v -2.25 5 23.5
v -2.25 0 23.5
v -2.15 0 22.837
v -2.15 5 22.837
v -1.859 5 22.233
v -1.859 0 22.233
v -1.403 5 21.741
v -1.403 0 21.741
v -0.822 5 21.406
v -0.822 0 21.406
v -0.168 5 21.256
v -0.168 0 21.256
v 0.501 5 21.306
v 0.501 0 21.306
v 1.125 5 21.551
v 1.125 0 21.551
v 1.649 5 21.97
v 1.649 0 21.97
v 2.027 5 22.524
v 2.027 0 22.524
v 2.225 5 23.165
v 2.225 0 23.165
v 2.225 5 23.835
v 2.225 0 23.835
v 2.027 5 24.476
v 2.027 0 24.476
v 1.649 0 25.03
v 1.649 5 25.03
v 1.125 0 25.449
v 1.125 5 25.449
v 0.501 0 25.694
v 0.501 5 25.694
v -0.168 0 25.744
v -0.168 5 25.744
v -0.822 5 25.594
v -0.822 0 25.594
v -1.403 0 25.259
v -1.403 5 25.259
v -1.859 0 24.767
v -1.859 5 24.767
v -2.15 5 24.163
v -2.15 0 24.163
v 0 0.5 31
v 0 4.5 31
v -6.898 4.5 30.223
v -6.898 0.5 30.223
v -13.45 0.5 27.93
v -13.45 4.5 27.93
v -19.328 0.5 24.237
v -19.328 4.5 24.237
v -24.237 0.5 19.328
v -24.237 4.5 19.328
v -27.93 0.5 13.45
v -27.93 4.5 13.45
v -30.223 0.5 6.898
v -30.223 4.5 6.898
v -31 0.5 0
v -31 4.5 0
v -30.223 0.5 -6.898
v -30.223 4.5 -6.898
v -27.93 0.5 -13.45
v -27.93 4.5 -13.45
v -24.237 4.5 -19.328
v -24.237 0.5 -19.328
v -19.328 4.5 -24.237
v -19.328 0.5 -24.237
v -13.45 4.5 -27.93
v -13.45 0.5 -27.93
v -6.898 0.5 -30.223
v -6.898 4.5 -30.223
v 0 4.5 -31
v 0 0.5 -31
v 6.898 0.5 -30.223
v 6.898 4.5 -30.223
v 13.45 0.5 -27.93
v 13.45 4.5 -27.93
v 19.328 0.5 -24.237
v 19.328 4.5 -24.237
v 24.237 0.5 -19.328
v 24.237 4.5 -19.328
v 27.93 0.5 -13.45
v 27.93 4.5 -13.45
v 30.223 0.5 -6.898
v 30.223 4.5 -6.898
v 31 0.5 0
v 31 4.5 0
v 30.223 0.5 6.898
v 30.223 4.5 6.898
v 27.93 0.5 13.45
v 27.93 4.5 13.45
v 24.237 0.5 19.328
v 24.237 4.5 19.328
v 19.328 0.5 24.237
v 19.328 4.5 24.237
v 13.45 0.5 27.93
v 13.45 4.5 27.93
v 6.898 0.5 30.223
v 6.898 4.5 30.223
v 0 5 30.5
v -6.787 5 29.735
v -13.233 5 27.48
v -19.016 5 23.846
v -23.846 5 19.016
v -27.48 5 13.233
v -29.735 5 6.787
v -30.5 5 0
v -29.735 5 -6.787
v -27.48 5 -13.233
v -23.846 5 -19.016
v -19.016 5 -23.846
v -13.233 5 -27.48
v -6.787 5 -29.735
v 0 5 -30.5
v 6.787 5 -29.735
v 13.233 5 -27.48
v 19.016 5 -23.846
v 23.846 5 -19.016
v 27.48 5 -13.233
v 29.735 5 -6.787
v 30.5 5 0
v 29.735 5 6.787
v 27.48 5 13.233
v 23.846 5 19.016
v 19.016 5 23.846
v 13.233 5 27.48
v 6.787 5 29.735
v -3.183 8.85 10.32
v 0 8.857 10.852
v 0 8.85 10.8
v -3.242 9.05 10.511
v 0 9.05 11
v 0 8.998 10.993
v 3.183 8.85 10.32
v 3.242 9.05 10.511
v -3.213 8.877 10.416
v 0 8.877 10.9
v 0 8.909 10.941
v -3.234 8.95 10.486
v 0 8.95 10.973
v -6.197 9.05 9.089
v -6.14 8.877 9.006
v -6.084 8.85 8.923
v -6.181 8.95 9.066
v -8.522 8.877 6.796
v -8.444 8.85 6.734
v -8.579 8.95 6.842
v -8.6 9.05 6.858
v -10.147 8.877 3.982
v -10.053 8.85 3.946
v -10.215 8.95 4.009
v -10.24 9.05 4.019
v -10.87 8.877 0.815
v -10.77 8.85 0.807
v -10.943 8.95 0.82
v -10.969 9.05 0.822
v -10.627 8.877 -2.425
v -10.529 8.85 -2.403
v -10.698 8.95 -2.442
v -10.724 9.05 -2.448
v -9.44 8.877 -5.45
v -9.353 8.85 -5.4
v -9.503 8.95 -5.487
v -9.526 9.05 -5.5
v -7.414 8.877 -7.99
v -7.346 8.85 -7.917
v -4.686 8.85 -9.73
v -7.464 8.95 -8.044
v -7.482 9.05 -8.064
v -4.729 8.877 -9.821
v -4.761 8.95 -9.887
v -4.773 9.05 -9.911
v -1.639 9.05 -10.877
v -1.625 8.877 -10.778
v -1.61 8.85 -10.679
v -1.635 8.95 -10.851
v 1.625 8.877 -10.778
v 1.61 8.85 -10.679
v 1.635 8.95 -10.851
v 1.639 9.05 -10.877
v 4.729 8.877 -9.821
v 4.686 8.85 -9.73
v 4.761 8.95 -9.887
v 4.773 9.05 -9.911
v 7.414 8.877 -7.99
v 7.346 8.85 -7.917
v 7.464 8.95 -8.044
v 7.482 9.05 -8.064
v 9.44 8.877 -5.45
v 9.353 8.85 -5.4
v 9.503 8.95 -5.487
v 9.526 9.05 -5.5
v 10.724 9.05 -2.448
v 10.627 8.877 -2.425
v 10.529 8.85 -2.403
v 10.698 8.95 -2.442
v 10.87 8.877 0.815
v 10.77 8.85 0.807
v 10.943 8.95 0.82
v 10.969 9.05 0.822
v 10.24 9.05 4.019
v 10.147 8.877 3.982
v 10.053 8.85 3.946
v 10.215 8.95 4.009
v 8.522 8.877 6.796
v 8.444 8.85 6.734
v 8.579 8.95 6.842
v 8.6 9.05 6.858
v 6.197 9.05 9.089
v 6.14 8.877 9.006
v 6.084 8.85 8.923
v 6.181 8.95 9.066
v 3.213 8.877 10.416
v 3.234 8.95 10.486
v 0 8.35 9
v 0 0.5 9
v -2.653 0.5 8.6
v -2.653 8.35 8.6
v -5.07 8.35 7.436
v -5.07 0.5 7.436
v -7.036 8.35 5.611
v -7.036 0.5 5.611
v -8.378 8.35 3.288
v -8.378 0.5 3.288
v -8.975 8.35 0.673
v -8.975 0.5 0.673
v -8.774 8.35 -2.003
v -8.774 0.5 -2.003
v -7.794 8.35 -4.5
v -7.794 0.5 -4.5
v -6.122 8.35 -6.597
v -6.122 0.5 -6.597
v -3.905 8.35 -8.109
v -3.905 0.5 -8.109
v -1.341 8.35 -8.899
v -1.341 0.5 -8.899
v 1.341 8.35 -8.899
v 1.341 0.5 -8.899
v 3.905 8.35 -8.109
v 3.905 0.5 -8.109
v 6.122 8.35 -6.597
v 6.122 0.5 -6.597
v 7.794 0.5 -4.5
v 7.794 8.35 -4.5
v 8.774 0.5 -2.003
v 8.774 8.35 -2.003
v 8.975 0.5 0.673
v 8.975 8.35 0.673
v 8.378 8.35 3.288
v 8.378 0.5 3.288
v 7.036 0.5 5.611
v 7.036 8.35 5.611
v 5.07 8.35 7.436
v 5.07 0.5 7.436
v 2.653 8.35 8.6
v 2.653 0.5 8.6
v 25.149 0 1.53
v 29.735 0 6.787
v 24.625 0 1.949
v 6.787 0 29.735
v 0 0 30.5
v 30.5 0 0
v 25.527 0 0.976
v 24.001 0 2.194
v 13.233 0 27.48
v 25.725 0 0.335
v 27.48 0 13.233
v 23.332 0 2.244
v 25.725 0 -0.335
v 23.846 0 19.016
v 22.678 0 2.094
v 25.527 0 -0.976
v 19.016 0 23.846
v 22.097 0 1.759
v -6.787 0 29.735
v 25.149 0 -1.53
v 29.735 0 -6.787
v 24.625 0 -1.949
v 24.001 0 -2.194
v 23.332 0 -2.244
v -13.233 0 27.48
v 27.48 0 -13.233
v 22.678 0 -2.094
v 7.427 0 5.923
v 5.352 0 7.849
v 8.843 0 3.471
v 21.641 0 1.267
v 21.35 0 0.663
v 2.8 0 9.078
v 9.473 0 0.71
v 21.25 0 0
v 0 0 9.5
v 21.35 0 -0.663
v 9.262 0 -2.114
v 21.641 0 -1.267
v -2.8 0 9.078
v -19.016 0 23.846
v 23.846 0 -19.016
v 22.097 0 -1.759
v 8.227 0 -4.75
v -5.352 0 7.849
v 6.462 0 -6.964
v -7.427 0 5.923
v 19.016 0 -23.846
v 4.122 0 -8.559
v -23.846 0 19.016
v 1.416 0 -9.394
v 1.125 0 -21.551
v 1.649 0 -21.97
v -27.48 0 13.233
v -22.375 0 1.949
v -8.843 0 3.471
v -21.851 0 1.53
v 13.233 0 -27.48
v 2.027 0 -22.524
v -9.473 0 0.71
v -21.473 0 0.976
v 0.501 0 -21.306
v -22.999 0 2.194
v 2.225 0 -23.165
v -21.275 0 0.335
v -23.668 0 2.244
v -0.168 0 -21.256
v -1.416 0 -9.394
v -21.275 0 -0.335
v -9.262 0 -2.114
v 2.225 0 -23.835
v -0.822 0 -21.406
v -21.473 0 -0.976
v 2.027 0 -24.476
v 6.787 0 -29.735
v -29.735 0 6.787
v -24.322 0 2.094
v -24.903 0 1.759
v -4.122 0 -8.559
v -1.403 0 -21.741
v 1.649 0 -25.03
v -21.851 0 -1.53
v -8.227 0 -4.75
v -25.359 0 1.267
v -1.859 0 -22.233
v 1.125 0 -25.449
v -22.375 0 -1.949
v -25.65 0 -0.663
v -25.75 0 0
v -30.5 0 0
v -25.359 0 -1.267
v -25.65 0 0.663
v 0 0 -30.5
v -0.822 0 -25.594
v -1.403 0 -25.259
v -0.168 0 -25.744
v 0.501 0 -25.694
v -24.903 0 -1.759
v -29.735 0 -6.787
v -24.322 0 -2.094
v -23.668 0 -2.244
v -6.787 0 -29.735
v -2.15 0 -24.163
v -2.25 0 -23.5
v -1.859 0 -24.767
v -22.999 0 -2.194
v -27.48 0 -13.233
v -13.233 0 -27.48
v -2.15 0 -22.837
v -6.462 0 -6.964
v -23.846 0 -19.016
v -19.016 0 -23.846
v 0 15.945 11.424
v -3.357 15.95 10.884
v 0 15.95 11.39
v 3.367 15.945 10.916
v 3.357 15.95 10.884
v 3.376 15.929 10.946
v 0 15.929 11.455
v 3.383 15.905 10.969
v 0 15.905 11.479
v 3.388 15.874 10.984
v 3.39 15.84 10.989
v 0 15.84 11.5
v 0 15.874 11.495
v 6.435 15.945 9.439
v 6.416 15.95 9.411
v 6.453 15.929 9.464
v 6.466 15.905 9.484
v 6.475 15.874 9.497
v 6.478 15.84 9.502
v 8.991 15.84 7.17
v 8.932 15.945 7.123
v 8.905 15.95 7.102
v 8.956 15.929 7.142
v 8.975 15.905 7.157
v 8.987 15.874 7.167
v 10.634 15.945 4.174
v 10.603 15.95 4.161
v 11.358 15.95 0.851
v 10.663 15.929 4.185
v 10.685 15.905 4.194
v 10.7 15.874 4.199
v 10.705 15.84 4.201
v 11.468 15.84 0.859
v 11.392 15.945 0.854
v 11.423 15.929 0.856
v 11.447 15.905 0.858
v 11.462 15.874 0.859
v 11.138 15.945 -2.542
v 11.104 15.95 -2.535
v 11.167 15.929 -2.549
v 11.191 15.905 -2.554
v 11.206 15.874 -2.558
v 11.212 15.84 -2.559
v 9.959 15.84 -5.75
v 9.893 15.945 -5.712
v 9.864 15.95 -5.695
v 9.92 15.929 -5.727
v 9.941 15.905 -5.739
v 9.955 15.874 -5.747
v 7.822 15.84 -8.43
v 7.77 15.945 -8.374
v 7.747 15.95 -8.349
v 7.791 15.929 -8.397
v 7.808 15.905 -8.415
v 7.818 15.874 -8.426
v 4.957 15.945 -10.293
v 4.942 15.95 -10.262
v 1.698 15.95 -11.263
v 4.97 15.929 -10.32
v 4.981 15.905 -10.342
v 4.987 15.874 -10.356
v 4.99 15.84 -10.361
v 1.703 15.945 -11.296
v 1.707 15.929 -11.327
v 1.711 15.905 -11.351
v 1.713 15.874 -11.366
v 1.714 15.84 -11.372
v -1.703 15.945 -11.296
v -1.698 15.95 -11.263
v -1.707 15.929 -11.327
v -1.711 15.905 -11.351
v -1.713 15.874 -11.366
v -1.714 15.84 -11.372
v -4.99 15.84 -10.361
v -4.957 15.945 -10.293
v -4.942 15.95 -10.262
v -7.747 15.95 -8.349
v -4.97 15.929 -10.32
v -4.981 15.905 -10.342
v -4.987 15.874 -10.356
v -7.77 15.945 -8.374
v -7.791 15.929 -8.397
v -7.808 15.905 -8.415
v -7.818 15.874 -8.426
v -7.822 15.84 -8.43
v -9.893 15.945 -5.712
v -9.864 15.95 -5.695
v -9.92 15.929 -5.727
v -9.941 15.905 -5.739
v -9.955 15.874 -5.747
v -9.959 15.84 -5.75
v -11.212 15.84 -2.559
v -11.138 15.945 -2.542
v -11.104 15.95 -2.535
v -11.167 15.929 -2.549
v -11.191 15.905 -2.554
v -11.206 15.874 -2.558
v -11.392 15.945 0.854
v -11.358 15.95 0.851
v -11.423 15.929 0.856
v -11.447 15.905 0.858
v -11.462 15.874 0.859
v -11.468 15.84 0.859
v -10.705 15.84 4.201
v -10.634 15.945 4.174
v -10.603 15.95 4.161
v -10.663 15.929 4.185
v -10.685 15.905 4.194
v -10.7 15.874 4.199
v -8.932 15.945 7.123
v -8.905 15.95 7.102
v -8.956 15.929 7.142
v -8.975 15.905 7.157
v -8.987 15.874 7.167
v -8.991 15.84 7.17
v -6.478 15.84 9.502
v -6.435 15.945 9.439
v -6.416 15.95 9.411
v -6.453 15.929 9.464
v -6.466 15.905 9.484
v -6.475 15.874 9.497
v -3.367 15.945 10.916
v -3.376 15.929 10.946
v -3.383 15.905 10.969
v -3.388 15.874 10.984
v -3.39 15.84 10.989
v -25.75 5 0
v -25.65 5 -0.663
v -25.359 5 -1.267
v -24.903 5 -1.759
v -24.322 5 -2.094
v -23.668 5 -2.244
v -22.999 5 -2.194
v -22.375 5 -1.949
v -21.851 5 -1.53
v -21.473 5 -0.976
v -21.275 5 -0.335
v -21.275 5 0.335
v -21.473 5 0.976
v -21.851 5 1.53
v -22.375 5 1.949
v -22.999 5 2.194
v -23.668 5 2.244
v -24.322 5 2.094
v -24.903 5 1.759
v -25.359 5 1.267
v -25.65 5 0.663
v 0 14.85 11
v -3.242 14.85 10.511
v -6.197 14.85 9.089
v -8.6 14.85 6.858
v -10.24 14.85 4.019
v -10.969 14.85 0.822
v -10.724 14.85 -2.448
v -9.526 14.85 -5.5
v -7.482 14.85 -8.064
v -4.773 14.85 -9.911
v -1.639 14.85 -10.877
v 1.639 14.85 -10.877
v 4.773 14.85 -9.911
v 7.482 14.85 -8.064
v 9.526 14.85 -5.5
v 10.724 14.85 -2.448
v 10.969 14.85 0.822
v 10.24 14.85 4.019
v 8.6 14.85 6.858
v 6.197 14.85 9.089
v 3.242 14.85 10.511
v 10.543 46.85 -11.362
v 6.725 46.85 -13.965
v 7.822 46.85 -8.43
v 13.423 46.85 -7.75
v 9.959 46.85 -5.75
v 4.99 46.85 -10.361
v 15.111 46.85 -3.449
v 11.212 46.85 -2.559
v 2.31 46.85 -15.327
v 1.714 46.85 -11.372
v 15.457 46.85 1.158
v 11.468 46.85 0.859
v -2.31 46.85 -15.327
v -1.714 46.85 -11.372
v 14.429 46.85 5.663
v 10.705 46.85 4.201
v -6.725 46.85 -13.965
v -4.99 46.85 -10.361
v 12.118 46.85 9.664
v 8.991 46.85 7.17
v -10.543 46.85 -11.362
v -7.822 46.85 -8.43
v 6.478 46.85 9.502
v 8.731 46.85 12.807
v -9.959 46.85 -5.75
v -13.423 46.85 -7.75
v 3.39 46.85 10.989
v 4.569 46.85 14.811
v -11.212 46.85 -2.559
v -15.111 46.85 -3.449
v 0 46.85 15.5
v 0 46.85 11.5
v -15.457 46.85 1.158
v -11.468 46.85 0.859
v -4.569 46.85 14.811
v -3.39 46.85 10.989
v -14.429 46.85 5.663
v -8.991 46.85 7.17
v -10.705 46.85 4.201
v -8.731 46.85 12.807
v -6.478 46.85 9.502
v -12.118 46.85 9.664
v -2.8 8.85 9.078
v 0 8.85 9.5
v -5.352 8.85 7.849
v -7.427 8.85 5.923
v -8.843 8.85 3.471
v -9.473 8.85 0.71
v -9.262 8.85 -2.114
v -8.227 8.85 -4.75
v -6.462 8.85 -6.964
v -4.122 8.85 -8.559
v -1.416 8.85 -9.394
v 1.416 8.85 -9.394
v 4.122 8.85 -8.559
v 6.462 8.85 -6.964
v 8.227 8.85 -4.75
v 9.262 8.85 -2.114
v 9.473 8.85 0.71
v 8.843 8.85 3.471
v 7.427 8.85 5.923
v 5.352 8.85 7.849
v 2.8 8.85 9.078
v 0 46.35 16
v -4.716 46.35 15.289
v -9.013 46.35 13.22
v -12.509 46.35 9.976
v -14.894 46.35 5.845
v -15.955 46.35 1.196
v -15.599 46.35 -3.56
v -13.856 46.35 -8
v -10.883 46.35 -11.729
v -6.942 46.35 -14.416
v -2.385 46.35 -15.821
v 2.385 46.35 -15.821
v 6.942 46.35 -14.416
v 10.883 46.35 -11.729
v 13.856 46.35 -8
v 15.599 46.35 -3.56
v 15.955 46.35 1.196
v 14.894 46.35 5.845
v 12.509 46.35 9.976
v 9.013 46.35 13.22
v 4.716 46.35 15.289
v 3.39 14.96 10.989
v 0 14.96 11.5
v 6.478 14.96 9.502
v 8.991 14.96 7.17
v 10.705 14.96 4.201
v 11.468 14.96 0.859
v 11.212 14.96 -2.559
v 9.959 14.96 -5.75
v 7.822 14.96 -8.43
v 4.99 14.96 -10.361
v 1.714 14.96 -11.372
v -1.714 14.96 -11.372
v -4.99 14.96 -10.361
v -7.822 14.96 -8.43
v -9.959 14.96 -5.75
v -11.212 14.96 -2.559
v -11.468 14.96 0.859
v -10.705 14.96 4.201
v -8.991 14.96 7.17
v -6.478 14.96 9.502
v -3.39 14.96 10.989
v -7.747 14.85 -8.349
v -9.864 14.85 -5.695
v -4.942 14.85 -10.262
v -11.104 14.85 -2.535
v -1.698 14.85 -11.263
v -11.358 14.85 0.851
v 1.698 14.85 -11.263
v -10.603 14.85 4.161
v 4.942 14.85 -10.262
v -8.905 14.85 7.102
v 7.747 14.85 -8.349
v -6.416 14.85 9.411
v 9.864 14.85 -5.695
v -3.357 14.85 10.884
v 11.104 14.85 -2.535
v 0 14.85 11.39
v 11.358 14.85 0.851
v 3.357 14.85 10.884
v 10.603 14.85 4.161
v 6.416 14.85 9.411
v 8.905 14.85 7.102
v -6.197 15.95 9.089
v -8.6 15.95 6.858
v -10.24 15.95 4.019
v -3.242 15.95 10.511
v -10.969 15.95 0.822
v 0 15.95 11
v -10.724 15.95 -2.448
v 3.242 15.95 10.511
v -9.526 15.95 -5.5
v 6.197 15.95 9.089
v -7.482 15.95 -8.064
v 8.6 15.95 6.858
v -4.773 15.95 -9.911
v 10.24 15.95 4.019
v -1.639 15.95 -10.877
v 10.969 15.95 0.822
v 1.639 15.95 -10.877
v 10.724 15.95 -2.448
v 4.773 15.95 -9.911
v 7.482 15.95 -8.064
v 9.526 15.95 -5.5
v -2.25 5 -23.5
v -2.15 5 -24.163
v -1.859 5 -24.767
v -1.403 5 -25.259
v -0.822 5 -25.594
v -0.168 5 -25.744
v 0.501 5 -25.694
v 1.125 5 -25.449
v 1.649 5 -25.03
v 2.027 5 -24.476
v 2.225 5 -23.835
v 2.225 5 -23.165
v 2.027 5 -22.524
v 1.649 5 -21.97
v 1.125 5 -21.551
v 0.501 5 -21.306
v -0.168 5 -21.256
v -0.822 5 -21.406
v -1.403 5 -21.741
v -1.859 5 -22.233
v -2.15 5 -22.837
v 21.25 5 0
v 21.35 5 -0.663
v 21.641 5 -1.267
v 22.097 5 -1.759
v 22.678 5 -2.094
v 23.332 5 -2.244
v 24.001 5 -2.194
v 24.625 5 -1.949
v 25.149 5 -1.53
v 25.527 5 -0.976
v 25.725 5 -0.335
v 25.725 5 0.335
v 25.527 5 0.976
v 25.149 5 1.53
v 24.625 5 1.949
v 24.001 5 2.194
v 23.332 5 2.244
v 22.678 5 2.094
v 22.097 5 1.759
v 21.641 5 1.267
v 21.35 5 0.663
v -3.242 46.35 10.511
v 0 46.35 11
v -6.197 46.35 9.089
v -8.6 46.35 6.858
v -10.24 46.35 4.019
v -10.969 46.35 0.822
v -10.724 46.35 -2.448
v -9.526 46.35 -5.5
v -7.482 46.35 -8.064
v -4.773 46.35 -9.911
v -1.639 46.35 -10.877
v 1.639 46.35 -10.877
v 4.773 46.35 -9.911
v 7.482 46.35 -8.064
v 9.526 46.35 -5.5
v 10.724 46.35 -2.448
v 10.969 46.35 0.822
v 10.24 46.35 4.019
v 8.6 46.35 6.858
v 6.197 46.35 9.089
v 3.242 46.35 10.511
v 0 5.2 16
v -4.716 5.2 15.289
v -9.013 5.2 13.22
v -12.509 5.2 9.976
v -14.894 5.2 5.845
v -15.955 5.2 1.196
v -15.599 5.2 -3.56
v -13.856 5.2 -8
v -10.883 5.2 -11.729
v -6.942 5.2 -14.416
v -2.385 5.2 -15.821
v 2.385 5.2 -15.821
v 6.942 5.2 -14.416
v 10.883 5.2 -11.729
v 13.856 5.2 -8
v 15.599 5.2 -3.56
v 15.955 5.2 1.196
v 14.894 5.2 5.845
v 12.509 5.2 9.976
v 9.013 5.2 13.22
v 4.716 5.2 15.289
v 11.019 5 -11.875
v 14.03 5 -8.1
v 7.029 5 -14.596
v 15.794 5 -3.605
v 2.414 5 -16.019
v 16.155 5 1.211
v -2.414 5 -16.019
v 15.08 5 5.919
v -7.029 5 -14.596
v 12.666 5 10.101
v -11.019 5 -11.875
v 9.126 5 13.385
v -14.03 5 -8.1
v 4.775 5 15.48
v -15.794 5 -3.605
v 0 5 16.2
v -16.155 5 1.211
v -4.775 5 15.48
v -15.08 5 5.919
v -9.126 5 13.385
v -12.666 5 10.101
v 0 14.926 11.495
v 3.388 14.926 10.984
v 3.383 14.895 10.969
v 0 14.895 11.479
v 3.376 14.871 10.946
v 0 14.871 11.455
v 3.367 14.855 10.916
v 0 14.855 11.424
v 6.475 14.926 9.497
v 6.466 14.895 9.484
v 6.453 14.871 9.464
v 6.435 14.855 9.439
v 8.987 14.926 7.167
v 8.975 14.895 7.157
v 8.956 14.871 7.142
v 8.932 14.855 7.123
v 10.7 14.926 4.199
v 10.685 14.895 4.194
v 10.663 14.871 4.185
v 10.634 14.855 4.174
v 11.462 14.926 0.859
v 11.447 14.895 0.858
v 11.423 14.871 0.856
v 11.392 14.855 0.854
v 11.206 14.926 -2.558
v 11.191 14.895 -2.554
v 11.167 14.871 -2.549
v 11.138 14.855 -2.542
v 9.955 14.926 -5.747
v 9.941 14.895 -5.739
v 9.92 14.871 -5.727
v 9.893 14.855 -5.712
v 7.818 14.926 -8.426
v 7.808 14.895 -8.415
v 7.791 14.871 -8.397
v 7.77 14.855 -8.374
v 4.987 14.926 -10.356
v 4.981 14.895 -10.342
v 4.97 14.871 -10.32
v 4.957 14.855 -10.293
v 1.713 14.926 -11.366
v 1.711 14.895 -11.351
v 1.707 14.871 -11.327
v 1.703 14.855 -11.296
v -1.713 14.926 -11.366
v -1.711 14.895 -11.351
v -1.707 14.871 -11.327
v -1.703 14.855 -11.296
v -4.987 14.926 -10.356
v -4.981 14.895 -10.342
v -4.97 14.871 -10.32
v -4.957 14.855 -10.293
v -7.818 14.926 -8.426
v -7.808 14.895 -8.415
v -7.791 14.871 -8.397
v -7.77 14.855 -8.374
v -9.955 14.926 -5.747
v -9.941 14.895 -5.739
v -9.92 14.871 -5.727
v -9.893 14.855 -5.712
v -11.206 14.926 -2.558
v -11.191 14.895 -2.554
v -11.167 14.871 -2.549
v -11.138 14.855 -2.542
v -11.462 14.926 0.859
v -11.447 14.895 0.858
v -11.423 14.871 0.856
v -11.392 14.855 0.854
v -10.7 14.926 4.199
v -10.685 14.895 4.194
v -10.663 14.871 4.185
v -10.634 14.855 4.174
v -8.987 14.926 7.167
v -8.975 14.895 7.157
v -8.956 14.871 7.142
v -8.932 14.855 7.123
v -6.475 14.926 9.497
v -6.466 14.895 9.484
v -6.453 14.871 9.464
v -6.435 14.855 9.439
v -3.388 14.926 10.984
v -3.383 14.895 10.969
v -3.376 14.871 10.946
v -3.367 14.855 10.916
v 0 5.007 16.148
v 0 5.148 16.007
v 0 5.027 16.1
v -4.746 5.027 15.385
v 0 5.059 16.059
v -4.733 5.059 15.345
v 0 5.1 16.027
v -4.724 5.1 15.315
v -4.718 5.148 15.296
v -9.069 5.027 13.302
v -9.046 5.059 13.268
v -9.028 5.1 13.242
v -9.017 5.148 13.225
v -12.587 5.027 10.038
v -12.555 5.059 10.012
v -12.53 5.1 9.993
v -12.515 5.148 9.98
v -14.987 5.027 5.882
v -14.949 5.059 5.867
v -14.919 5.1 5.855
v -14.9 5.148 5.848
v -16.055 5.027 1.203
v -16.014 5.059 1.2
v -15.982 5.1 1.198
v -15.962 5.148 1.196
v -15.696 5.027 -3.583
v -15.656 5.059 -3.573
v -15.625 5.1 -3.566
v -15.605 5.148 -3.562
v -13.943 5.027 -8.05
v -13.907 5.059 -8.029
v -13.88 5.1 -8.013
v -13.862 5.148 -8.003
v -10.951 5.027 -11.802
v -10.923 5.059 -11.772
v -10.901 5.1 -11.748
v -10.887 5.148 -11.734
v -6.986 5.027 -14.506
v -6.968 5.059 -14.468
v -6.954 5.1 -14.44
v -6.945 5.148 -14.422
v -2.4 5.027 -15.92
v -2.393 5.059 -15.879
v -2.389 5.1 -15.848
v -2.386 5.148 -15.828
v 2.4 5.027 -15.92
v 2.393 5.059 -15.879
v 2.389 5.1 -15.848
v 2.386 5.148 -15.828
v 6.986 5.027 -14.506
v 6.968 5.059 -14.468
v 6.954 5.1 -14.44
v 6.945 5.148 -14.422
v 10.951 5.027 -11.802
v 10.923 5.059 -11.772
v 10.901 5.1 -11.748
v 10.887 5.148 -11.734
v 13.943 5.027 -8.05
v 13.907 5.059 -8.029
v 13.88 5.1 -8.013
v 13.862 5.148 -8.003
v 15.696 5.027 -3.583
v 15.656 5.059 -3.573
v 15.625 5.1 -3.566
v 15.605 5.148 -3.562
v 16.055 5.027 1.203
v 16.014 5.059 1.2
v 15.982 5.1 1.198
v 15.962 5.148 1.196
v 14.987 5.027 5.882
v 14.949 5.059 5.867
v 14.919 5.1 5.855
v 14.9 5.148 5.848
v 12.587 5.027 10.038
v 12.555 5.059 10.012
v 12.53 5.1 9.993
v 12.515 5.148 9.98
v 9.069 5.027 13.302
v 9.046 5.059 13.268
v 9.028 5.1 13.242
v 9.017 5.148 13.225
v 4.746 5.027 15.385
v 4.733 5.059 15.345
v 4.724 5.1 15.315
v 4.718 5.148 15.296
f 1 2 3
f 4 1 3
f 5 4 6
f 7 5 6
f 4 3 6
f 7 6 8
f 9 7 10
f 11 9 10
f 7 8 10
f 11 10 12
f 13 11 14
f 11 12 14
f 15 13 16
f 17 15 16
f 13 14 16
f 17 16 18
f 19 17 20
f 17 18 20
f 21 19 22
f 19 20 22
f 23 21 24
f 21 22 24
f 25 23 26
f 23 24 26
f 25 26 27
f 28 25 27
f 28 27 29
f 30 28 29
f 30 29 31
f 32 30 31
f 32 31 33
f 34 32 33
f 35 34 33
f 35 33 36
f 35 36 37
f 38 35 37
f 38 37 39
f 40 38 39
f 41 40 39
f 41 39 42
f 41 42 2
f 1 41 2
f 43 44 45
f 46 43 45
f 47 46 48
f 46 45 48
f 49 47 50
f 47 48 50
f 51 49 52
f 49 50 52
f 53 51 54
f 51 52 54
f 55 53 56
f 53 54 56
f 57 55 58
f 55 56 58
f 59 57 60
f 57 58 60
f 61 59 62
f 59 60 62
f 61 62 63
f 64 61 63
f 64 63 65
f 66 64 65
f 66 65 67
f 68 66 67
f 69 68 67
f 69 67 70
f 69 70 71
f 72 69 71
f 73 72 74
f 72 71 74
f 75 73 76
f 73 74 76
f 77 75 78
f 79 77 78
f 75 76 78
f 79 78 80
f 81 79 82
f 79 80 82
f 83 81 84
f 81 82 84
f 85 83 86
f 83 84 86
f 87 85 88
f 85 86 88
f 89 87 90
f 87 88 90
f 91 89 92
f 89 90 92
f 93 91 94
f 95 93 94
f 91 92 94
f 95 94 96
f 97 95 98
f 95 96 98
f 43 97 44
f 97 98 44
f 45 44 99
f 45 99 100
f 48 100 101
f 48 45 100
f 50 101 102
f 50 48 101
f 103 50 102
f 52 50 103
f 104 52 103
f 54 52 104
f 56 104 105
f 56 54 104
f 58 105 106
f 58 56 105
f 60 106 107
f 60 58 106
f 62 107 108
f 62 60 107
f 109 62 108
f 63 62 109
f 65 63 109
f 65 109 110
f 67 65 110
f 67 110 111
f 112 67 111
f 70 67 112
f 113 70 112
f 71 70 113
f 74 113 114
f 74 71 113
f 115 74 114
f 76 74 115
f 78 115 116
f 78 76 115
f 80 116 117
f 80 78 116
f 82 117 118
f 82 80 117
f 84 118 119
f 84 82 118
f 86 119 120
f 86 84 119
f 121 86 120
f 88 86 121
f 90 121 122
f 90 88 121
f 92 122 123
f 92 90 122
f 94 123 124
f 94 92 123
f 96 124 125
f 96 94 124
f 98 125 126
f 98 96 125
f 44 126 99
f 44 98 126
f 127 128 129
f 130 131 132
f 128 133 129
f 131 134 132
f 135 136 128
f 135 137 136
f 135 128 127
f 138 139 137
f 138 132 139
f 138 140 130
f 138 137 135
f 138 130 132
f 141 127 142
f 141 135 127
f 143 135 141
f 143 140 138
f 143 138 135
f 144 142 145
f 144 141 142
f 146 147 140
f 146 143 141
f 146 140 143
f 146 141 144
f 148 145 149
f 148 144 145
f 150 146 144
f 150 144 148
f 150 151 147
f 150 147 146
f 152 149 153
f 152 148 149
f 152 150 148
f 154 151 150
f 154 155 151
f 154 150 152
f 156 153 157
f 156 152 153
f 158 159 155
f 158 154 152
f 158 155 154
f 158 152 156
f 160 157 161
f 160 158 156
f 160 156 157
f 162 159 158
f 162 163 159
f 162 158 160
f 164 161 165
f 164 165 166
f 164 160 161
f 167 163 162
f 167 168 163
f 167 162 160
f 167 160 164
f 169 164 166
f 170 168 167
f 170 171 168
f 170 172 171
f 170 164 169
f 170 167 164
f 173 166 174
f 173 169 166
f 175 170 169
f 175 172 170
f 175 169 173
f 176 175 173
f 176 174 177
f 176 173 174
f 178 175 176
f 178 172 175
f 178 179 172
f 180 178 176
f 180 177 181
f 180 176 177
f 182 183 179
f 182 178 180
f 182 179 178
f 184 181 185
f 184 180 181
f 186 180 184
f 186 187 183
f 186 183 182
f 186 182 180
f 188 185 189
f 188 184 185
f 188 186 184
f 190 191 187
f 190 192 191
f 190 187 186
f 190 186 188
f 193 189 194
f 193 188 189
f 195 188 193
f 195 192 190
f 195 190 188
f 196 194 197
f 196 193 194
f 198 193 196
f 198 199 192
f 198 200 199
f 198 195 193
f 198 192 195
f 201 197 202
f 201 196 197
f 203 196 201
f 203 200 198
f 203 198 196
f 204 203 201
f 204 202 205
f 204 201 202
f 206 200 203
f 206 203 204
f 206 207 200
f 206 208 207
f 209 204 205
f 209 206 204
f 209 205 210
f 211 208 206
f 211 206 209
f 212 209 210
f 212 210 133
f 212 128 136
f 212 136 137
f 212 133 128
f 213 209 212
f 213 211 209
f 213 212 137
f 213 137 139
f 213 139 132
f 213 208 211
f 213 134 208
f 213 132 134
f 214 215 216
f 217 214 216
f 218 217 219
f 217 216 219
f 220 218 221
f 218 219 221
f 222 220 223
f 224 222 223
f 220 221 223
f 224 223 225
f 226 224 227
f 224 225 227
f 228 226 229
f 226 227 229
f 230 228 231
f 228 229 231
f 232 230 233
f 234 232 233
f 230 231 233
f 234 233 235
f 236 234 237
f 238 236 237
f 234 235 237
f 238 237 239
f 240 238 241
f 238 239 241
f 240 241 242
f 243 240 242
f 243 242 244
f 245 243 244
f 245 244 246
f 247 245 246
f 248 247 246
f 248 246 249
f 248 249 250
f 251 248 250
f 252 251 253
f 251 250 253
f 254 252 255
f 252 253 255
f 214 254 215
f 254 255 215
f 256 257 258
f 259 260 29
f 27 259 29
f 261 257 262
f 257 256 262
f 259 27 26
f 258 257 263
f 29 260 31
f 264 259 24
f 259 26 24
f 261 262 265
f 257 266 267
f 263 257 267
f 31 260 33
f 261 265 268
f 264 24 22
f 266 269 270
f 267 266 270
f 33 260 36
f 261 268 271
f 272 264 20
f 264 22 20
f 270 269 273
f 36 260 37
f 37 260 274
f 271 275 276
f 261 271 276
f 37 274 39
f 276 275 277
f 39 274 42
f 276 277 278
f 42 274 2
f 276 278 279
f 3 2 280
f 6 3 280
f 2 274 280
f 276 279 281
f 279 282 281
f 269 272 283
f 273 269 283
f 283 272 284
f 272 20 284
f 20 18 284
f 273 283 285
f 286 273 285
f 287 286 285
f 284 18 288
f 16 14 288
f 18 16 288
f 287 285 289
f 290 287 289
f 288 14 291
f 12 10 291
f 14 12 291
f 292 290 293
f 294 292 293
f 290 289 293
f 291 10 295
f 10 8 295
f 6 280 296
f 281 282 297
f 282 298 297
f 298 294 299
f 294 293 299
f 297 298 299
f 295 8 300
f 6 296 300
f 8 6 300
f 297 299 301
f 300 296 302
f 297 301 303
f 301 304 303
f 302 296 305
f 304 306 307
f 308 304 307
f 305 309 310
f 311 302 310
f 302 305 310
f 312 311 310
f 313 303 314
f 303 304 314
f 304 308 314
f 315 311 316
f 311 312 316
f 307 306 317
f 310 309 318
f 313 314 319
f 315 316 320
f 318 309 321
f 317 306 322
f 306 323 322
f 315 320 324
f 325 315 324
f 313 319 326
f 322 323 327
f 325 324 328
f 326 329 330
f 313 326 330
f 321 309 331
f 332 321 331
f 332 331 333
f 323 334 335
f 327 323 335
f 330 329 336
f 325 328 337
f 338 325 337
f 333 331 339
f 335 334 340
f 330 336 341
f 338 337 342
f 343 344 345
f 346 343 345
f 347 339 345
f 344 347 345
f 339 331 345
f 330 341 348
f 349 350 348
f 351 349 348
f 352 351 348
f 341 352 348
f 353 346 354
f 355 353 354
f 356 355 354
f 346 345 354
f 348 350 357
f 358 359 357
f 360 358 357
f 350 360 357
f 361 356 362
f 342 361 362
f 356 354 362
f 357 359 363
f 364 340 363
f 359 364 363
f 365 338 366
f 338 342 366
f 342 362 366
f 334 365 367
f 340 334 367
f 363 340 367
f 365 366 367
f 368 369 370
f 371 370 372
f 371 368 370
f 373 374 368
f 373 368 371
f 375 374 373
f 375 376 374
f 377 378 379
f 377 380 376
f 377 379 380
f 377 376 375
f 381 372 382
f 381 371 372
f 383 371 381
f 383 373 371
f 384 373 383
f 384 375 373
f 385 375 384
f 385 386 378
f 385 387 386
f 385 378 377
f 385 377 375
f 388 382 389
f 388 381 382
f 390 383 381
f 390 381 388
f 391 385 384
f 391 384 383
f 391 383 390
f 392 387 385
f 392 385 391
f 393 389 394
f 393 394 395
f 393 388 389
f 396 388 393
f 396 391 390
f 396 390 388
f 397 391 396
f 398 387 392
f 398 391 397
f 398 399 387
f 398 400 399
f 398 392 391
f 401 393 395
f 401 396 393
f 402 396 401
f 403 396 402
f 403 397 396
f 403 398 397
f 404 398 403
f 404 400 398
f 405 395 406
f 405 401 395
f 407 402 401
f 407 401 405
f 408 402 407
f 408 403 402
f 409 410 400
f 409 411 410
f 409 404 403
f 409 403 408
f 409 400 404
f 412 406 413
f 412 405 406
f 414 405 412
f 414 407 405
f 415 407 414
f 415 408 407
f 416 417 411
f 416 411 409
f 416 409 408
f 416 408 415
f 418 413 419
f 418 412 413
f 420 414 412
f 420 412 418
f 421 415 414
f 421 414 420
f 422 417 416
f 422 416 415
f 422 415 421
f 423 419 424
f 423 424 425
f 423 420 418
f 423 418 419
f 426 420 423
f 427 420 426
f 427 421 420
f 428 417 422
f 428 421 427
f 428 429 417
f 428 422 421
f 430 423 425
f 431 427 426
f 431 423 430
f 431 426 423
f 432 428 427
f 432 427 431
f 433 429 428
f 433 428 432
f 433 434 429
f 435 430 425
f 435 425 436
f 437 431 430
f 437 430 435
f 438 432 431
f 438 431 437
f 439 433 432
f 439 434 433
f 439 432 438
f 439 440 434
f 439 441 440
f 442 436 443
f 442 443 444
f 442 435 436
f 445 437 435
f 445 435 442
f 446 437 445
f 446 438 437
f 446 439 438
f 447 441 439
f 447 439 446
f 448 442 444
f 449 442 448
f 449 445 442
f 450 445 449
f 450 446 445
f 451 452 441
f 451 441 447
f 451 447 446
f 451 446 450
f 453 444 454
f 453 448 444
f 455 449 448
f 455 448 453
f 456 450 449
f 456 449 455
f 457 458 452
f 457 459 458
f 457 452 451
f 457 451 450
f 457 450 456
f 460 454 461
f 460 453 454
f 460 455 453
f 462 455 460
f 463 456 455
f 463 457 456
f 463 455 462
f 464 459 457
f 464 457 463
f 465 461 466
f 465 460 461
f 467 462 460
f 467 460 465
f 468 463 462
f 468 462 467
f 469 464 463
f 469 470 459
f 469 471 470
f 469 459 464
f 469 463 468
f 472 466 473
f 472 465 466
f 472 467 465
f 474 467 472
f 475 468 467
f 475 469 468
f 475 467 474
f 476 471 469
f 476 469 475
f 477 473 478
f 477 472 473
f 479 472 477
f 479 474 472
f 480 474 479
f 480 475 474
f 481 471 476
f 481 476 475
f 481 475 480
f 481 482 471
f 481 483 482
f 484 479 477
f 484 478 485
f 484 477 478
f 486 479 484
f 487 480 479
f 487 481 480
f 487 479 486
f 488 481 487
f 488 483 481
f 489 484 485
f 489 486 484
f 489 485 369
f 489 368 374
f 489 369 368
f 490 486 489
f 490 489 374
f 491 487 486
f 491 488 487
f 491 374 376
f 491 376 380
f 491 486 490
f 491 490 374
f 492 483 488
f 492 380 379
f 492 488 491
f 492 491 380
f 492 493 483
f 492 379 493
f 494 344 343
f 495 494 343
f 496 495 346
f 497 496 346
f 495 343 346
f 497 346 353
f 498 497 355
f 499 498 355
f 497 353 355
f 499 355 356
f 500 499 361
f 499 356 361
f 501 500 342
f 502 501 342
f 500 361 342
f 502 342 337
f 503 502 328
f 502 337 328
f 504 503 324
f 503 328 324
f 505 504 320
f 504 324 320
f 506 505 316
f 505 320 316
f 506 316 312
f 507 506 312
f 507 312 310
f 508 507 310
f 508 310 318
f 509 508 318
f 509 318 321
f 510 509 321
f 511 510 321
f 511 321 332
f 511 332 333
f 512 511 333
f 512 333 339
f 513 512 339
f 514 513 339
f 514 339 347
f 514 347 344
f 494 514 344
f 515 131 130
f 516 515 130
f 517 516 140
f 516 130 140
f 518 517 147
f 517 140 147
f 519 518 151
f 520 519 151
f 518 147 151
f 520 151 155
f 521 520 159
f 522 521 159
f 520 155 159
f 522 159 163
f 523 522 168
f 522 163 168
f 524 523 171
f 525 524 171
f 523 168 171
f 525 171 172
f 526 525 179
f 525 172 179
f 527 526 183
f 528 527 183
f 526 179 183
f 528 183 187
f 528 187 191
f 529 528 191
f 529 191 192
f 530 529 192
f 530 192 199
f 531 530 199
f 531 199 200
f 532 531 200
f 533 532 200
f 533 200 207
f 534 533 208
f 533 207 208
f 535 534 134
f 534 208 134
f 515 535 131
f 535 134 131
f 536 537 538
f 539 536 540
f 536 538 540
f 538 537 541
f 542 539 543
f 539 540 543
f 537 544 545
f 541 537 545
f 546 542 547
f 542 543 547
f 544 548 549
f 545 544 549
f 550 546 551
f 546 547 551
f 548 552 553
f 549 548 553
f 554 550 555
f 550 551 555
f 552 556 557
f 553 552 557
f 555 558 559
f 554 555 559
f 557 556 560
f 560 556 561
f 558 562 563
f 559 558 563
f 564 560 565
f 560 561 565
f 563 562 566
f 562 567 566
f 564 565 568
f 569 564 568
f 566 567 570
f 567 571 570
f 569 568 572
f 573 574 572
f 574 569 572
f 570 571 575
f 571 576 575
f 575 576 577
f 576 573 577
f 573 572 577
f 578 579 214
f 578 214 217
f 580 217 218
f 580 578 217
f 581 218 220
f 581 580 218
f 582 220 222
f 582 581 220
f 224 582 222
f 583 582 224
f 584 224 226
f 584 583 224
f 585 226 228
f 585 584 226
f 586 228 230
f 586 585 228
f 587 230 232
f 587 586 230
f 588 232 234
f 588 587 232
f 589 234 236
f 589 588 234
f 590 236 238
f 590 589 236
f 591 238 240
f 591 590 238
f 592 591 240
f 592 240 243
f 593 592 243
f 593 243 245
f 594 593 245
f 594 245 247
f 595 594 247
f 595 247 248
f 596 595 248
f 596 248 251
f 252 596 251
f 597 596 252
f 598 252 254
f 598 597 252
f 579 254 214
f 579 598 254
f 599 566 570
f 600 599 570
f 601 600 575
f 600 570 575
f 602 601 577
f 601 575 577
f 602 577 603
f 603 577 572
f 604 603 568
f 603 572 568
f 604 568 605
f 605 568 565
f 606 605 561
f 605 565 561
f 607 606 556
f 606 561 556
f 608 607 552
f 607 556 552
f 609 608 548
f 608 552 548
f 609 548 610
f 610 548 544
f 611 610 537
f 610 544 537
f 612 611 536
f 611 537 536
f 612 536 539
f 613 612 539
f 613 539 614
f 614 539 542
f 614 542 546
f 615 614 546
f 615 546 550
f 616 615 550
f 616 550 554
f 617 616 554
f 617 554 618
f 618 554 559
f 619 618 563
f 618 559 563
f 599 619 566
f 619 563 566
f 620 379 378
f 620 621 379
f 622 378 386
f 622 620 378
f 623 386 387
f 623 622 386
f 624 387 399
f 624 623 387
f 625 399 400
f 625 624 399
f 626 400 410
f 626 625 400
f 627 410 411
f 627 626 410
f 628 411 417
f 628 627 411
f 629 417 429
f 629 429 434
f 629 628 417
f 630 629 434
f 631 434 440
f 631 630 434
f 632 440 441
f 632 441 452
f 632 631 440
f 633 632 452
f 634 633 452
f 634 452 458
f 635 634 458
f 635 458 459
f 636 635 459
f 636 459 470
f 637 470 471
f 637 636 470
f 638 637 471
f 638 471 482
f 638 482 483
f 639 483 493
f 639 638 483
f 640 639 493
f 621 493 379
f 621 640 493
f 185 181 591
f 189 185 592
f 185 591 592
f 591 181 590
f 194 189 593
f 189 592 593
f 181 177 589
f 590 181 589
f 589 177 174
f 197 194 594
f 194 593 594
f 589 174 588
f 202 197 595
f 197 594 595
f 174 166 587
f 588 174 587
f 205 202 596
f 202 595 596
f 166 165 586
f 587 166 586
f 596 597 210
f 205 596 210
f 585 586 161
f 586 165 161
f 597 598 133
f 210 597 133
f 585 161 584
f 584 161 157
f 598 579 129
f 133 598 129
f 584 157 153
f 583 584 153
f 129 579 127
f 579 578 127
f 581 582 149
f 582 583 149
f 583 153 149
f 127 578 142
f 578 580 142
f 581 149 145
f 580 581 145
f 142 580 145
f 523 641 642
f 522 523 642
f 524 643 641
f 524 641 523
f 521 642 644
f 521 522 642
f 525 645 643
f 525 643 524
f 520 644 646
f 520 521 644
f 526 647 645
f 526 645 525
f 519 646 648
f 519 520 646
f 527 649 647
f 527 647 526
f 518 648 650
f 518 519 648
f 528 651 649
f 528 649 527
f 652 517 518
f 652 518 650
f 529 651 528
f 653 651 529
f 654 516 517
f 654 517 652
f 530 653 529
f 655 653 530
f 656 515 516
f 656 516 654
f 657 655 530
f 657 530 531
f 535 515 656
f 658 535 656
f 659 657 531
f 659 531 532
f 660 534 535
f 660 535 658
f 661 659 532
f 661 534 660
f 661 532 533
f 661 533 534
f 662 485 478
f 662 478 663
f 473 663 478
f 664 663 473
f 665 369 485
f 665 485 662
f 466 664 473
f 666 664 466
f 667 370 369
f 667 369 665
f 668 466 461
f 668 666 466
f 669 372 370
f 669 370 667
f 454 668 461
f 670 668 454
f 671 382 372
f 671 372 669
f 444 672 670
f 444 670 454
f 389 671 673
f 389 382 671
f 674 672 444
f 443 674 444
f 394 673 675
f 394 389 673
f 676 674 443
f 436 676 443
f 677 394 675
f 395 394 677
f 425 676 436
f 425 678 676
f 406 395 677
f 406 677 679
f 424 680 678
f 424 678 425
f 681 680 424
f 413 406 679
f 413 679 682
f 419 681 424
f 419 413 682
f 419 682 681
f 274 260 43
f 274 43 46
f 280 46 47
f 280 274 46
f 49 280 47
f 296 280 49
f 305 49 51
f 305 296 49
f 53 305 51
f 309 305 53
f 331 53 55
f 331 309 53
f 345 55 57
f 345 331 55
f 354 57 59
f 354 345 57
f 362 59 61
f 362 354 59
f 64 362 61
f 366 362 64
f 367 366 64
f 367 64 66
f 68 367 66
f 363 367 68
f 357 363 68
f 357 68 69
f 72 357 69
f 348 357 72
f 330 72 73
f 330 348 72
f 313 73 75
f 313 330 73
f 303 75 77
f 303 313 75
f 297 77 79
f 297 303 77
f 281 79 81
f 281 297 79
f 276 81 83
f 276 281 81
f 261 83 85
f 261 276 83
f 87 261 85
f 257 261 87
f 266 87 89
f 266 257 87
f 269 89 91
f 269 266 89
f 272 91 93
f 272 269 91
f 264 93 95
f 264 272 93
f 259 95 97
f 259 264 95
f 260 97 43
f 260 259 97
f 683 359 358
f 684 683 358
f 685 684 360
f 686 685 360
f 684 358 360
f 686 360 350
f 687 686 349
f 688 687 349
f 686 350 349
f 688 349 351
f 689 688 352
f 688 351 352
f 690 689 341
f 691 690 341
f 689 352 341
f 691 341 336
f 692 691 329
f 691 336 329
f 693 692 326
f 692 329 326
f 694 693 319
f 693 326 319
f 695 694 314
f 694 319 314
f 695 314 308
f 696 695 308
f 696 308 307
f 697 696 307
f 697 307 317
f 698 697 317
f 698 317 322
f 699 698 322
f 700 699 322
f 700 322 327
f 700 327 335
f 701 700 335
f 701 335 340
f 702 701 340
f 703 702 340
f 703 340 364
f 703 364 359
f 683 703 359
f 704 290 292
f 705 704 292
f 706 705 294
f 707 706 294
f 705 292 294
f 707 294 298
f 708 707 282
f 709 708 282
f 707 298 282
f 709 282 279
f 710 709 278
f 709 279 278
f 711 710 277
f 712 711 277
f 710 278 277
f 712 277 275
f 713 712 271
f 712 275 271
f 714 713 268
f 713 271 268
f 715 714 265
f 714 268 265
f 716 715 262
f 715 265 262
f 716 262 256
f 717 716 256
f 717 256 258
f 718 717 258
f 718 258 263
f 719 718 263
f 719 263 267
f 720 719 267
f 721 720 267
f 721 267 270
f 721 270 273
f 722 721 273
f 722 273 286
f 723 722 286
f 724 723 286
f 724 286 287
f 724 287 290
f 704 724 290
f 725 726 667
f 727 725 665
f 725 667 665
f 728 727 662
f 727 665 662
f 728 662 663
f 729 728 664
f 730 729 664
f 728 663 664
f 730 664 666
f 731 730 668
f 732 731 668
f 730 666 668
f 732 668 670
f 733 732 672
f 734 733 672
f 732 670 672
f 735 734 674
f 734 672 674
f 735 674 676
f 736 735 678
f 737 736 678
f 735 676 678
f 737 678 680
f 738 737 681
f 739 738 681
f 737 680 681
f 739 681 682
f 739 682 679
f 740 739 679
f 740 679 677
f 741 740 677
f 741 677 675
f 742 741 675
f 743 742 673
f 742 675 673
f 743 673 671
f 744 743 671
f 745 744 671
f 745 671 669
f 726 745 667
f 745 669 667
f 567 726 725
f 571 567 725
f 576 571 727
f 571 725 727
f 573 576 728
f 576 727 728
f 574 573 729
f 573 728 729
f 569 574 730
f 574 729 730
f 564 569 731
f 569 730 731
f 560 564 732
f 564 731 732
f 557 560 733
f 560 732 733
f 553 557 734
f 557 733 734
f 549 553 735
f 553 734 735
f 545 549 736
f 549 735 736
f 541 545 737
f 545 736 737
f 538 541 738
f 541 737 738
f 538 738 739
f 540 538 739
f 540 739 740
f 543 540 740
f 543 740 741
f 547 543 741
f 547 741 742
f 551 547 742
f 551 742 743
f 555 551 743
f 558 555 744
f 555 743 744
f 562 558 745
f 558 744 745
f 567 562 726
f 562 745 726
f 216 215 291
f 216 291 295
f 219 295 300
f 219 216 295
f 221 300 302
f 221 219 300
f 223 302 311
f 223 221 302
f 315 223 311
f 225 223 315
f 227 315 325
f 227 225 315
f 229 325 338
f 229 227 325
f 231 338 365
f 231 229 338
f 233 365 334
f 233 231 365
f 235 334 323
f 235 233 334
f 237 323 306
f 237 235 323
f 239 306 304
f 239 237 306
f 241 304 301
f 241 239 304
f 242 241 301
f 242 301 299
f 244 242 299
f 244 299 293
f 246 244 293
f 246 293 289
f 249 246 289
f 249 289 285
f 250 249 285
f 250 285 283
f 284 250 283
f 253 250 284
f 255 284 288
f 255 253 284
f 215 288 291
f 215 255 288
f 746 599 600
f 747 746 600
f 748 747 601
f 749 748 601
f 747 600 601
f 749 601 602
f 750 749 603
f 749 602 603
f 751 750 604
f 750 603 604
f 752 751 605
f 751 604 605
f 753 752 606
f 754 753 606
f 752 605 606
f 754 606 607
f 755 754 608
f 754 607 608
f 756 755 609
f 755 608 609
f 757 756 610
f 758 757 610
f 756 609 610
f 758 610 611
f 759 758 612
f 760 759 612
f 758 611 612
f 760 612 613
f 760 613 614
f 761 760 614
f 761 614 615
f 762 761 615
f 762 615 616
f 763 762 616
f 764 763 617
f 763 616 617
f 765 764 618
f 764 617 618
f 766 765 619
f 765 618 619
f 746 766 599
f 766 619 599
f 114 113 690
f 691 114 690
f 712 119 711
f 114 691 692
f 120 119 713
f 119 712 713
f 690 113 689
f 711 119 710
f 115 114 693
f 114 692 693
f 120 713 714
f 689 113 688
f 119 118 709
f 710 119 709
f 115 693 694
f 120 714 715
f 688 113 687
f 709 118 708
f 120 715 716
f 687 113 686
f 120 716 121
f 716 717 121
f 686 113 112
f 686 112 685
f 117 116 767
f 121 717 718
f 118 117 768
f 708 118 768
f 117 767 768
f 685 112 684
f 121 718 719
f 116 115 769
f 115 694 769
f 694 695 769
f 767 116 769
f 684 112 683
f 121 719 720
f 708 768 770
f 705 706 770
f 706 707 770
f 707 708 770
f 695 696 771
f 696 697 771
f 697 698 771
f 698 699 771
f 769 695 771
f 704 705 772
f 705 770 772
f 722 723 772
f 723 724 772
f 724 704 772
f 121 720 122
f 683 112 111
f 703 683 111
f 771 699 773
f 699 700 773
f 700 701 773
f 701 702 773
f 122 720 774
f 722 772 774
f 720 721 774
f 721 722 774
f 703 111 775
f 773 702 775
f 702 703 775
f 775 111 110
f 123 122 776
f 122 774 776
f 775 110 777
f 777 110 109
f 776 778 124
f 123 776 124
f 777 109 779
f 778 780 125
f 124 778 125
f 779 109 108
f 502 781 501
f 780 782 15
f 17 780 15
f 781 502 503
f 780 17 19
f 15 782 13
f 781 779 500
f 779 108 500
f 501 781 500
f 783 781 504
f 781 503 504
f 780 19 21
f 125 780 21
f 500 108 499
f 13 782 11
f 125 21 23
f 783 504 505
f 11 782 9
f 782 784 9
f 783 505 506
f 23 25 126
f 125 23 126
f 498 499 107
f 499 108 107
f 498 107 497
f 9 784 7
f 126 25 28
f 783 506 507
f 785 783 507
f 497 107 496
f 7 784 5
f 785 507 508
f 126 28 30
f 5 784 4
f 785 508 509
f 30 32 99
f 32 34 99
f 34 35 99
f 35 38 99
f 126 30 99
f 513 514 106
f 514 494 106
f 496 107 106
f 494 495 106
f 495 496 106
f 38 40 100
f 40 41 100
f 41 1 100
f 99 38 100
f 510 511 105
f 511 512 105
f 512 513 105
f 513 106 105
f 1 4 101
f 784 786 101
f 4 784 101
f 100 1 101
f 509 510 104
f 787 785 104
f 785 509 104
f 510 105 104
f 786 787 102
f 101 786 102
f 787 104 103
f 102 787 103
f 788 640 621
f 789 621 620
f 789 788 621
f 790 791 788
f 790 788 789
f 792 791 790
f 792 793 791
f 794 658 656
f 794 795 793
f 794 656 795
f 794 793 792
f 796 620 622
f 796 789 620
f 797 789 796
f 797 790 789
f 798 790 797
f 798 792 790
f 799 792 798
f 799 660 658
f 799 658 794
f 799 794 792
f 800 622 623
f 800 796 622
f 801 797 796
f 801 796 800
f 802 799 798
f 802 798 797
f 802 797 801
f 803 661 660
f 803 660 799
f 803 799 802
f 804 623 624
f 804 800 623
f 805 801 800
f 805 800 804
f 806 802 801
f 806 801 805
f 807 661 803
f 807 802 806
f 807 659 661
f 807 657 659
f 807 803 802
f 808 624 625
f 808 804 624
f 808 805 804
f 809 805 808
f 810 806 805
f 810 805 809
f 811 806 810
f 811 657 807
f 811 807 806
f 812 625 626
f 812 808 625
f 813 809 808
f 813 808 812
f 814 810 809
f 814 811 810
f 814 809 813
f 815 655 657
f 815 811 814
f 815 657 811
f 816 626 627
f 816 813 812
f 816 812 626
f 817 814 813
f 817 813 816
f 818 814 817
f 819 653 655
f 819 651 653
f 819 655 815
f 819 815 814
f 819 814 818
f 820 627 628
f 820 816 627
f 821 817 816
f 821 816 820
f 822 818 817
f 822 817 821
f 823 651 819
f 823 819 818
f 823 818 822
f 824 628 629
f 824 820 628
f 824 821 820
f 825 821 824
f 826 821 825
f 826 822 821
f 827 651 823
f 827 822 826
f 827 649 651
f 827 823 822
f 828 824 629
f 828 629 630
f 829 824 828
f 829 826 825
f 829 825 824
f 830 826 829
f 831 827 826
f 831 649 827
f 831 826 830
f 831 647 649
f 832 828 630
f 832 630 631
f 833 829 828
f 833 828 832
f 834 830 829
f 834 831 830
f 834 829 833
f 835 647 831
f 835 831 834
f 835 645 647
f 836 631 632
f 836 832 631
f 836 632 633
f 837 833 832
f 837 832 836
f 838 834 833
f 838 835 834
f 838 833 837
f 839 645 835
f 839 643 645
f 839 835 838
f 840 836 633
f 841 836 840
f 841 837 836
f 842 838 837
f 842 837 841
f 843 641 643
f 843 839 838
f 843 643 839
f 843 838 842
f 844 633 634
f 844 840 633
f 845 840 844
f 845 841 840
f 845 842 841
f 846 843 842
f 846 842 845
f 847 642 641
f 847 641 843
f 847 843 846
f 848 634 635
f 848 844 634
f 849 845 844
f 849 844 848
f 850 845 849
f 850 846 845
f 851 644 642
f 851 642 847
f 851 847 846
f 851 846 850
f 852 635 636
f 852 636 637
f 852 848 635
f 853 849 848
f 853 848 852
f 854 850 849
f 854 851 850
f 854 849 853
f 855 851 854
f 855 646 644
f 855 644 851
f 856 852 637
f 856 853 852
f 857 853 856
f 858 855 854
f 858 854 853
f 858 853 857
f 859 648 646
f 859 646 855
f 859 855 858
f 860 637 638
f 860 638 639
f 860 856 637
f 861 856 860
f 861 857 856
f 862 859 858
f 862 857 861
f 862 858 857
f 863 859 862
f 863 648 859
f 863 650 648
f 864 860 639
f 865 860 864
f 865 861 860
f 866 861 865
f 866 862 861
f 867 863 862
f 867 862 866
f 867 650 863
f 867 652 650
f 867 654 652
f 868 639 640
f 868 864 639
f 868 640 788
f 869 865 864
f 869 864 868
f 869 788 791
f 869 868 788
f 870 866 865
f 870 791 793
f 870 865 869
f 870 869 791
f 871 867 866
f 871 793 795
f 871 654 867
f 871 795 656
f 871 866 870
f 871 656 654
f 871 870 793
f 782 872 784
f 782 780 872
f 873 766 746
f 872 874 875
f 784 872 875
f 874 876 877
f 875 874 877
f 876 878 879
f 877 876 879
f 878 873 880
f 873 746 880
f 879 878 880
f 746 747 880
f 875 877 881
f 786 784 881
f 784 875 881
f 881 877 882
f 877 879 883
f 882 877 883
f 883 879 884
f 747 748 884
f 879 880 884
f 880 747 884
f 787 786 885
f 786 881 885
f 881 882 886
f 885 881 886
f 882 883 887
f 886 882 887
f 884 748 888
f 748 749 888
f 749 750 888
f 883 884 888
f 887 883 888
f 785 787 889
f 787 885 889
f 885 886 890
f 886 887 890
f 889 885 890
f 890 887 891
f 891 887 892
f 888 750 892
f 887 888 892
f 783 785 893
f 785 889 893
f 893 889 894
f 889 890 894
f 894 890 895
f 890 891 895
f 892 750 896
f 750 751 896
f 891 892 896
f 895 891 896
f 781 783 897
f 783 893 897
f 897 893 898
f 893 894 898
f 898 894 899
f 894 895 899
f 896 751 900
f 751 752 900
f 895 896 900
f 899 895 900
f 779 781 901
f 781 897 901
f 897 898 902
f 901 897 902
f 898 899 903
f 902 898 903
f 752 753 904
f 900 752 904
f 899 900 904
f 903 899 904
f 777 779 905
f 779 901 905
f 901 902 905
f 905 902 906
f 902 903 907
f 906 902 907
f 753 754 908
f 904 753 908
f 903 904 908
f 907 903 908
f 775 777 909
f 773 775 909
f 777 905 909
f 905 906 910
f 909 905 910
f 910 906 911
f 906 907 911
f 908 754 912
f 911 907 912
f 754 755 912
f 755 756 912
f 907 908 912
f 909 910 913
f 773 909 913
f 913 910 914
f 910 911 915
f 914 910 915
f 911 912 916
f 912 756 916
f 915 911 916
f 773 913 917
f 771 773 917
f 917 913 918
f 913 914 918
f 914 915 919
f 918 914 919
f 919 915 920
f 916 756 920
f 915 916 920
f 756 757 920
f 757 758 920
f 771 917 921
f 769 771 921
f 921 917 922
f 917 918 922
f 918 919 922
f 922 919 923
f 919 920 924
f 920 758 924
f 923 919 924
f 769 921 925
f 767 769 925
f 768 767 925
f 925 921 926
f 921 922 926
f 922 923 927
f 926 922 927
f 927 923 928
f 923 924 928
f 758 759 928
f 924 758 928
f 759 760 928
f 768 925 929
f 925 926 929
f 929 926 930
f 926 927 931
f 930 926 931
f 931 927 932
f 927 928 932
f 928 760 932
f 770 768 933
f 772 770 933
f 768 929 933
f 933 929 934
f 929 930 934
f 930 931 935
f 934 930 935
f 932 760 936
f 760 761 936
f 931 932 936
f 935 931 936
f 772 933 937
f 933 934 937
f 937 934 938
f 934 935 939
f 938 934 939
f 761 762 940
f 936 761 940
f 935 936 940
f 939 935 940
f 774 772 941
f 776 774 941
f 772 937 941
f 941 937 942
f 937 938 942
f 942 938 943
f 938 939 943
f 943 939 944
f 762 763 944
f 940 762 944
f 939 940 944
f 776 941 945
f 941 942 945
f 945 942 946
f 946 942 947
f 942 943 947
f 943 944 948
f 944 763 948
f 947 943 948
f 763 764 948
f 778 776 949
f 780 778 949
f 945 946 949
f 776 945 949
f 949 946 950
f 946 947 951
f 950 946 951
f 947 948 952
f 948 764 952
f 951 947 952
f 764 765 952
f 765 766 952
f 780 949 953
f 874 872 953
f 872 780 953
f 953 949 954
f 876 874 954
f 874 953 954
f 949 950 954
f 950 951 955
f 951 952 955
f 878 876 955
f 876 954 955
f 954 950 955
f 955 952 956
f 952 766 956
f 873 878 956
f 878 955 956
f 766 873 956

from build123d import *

# Parameters (mm, degrees)
M4_CLEARANCE_HOLE1_D     = 4.5
M4_CLEARANCE_HOLE1_DEPTH = 10
M4_CLEARANCE_HOLE1_TIP   = 1.351936393
FILLET1_R                = 0.2
CHAMFER1_SIZE            = 0.5


with BuildPart() as part:
    # Sketch1 → Revolve1 (revolve)
    with BuildSketch(Plane.XY, mode=Mode.PRIVATE) as revolve1_sk:
        Polygon((9, 0), (31, 0), (31, 5), (16, 5), (16, 46.85), (11, 46.85), (11, 8.85), (9, 8.85), align=None)
    revolve(revolve1_sk.sketch.rotate(Axis((0, 9.488188976, 0), (0, -1, 0)), 90), axis=Axis((0, 9.488188976, 0), (0, -1, 0)))

    # M4 Clearance Hole1
    with Locations(Plane(origin=(0, 5, 0), x_dir=(1, 0, 0), z_dir=(0, 1, 0))):
        with Locations((23.5, 0), (0, 23.5), (0, -23.5), (-23.5, 0)):
            Hole(M4_CLEARANCE_HOLE1_D / 2, depth=M4_CLEARANCE_HOLE1_DEPTH)
            with Locations((0, 0, -(M4_CLEARANCE_HOLE1_DEPTH + M4_CLEARANCE_HOLE1_TIP / 2))):  # 118° drill point
                Cone(0, M4_CLEARANCE_HOLE1_D / 2, M4_CLEARANCE_HOLE1_TIP, mode=Mode.SUBTRACT)

    # Sketch5 → Groove for BS 3673 P4 - B022M, Internal Circlip1 (revolve, cut)
    with BuildSketch(Plane(origin=(0, 9.488188976, 0), x_dir=(0, 0, 1), z_dir=(-1, 0, 0))):
        with BuildLine():
            Line((11.39, 5.361811024), (9.9, 5.361811024))
            Line((9.9, 5.361811024), (9.9, 6.461811024))
            Line((9.9, 6.461811024), (11.39, 6.461811024))
            ThreePointArc((11.39, 6.461811024), (11.467781746, 6.42959277), (11.5, 6.351811024))
            Line((11.5, 6.351811024), (11.5, 5.471811024))
            ThreePointArc((11.5, 5.471811024), (11.467781746, 5.394029278), (11.39, 5.361811024))
        make_face()
    revolve(axis=Axis((0, -40.511811024, 0), (0, 1, 0)), mode=Mode.SUBTRACT)

    # Fillet1
    fillet1_edges = [part.edges().sort_by_distance(p)[0] for p in [
        (0, 8.85, -11),
        (0, 5, -16),
    ]]
    fillet(fillet1_edges, radius=FILLET1_R)

    # Chamfer1
    chamfer1_edges = [part.edges().sort_by_distance(p)[0] for p in [
        (0, 0, -9),
        (0, 8.85, -9),
        (0, 46.85, -11),
        (0, 46.85, -16),
        (0, 5, -31),
        (0, 0, -31),
    ]]
    chamfer(chamfer1_edges, length=CHAMFER1_SIZE)


solid = part.part
